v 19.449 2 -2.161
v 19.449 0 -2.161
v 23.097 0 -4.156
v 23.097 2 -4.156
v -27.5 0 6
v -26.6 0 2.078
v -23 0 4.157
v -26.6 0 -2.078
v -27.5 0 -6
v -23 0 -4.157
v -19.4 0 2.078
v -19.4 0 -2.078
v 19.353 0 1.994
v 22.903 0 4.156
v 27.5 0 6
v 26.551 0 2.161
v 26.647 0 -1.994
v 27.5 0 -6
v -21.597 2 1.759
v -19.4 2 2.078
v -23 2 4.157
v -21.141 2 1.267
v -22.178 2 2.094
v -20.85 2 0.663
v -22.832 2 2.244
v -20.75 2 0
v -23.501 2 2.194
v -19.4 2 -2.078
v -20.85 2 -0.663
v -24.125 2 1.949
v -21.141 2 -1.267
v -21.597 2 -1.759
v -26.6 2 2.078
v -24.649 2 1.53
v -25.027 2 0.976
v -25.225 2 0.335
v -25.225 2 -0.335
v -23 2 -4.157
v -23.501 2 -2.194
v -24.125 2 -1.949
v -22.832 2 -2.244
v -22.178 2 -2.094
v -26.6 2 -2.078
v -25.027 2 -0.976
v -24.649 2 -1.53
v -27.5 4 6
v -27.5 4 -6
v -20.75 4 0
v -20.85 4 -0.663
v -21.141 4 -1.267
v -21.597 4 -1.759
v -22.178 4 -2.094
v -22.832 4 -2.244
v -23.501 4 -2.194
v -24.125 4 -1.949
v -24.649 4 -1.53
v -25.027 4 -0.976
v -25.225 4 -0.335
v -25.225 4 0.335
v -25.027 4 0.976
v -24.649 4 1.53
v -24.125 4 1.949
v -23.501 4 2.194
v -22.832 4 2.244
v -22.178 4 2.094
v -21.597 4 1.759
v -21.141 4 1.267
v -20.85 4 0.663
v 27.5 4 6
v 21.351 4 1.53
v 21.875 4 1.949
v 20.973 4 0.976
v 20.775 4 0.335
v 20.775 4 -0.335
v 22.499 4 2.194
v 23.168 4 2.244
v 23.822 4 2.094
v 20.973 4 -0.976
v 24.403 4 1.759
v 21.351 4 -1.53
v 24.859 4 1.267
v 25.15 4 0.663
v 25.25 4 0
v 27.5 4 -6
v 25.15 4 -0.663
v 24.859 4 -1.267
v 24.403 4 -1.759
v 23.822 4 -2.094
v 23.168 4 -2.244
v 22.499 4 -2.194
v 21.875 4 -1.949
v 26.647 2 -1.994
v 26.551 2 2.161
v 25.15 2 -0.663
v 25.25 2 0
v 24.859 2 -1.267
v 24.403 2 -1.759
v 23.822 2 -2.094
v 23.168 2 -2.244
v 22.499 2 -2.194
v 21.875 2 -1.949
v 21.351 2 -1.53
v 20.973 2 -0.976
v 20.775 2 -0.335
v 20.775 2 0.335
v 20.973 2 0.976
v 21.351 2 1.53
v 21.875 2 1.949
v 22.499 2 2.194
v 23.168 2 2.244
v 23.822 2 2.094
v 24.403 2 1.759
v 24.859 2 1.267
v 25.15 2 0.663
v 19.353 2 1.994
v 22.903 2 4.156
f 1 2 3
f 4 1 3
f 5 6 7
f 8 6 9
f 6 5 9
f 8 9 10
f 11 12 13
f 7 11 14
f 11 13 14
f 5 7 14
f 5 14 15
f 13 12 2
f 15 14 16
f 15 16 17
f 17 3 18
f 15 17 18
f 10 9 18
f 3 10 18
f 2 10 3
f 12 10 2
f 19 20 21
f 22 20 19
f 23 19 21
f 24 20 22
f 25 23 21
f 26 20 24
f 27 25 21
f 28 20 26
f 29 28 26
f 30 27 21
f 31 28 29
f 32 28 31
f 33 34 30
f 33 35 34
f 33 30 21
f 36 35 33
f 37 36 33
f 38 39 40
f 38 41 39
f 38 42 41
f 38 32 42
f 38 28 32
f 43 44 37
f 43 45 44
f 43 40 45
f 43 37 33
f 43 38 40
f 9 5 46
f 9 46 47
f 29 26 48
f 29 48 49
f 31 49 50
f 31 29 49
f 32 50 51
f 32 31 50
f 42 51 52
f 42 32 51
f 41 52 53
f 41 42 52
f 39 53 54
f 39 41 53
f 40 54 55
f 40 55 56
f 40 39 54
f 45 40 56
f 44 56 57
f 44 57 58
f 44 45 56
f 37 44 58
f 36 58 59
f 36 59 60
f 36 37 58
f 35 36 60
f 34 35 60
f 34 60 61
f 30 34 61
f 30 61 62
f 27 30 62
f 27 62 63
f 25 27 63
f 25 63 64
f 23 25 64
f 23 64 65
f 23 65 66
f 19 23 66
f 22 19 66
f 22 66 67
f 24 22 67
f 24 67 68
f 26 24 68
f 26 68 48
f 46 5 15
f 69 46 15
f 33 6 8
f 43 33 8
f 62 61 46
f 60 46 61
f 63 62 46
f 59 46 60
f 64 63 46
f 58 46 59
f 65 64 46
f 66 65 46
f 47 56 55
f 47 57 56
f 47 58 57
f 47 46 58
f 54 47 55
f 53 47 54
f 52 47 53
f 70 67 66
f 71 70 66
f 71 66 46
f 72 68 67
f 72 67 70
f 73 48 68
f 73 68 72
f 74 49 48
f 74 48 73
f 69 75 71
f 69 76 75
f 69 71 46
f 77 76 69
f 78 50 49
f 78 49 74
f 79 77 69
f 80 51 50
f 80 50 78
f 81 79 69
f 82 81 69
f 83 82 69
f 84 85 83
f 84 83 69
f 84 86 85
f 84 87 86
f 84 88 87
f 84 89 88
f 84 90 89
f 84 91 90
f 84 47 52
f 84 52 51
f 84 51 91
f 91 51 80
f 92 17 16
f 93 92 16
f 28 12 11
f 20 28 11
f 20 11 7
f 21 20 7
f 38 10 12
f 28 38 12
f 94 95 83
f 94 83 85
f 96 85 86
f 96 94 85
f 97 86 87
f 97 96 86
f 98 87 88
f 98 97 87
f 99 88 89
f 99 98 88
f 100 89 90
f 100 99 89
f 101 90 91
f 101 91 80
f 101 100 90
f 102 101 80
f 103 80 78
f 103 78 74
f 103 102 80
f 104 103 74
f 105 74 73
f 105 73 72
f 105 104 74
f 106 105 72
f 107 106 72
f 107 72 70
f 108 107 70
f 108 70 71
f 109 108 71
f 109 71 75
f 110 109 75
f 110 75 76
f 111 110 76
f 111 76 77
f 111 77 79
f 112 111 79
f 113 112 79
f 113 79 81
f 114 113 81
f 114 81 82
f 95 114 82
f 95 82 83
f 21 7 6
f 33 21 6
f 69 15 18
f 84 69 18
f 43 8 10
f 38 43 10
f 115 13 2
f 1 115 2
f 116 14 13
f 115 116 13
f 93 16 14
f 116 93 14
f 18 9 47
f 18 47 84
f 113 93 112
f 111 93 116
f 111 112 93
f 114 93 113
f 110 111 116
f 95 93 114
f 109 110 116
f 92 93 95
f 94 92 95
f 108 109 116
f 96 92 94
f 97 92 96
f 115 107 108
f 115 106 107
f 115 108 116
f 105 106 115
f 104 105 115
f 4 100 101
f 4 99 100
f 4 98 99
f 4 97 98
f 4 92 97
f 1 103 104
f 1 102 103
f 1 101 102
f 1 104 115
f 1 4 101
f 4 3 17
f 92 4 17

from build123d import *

# Parameters (mm, degrees)
SKETCH1_W           = 55
SKETCH1_H           = 12
SKETCH1_R           = 2.25
BOSS_EXTRUDE1_DEPTH = 4
CUT_EXTRUDE1_DEPTH  = 2


with BuildPart() as part:
    # Sketch1 → Boss-Extrude1 (new body)
    with BuildSketch(Plane(origin=(0, 0, 0), x_dir=(1, 0, 0), z_dir=(0, 1, 0))):
        Rectangle(SKETCH1_W, SKETCH1_H)
        with Locations((-23, 0)):
            Circle(SKETCH1_R, mode=Mode.SUBTRACT)
        with Locations((23, 0)):
            Circle(SKETCH1_R, mode=Mode.SUBTRACT)
    extrude(amount=BOSS_EXTRUDE1_DEPTH)

    # Sketch2 → Cut-Extrude1 (cut)
    with BuildSketch(Plane(origin=(0, 0, 0), x_dir=(-1, 0, 0), z_dir=(0, -1, 0))):
        Polygon((-19.449221668, 2.161474783), (-23.096502906, 4.15580163), (-26.647281238, 1.994326847), (-26.550778332, -2.161474783), (-22.903497094, -4.15580163), (-19.352718762, -1.994326847), align=None)
        Polygon((23, 4.156921938), (19.4, 2.078460969), (19.4, -2.078460969), (23, -4.156921938), (26.6, -2.078460969), (26.6, 2.078460969), align=None)
    extrude(amount=-CUT_EXTRUDE1_DEPTH, mode=Mode.SUBTRACT)


solid = part.part
